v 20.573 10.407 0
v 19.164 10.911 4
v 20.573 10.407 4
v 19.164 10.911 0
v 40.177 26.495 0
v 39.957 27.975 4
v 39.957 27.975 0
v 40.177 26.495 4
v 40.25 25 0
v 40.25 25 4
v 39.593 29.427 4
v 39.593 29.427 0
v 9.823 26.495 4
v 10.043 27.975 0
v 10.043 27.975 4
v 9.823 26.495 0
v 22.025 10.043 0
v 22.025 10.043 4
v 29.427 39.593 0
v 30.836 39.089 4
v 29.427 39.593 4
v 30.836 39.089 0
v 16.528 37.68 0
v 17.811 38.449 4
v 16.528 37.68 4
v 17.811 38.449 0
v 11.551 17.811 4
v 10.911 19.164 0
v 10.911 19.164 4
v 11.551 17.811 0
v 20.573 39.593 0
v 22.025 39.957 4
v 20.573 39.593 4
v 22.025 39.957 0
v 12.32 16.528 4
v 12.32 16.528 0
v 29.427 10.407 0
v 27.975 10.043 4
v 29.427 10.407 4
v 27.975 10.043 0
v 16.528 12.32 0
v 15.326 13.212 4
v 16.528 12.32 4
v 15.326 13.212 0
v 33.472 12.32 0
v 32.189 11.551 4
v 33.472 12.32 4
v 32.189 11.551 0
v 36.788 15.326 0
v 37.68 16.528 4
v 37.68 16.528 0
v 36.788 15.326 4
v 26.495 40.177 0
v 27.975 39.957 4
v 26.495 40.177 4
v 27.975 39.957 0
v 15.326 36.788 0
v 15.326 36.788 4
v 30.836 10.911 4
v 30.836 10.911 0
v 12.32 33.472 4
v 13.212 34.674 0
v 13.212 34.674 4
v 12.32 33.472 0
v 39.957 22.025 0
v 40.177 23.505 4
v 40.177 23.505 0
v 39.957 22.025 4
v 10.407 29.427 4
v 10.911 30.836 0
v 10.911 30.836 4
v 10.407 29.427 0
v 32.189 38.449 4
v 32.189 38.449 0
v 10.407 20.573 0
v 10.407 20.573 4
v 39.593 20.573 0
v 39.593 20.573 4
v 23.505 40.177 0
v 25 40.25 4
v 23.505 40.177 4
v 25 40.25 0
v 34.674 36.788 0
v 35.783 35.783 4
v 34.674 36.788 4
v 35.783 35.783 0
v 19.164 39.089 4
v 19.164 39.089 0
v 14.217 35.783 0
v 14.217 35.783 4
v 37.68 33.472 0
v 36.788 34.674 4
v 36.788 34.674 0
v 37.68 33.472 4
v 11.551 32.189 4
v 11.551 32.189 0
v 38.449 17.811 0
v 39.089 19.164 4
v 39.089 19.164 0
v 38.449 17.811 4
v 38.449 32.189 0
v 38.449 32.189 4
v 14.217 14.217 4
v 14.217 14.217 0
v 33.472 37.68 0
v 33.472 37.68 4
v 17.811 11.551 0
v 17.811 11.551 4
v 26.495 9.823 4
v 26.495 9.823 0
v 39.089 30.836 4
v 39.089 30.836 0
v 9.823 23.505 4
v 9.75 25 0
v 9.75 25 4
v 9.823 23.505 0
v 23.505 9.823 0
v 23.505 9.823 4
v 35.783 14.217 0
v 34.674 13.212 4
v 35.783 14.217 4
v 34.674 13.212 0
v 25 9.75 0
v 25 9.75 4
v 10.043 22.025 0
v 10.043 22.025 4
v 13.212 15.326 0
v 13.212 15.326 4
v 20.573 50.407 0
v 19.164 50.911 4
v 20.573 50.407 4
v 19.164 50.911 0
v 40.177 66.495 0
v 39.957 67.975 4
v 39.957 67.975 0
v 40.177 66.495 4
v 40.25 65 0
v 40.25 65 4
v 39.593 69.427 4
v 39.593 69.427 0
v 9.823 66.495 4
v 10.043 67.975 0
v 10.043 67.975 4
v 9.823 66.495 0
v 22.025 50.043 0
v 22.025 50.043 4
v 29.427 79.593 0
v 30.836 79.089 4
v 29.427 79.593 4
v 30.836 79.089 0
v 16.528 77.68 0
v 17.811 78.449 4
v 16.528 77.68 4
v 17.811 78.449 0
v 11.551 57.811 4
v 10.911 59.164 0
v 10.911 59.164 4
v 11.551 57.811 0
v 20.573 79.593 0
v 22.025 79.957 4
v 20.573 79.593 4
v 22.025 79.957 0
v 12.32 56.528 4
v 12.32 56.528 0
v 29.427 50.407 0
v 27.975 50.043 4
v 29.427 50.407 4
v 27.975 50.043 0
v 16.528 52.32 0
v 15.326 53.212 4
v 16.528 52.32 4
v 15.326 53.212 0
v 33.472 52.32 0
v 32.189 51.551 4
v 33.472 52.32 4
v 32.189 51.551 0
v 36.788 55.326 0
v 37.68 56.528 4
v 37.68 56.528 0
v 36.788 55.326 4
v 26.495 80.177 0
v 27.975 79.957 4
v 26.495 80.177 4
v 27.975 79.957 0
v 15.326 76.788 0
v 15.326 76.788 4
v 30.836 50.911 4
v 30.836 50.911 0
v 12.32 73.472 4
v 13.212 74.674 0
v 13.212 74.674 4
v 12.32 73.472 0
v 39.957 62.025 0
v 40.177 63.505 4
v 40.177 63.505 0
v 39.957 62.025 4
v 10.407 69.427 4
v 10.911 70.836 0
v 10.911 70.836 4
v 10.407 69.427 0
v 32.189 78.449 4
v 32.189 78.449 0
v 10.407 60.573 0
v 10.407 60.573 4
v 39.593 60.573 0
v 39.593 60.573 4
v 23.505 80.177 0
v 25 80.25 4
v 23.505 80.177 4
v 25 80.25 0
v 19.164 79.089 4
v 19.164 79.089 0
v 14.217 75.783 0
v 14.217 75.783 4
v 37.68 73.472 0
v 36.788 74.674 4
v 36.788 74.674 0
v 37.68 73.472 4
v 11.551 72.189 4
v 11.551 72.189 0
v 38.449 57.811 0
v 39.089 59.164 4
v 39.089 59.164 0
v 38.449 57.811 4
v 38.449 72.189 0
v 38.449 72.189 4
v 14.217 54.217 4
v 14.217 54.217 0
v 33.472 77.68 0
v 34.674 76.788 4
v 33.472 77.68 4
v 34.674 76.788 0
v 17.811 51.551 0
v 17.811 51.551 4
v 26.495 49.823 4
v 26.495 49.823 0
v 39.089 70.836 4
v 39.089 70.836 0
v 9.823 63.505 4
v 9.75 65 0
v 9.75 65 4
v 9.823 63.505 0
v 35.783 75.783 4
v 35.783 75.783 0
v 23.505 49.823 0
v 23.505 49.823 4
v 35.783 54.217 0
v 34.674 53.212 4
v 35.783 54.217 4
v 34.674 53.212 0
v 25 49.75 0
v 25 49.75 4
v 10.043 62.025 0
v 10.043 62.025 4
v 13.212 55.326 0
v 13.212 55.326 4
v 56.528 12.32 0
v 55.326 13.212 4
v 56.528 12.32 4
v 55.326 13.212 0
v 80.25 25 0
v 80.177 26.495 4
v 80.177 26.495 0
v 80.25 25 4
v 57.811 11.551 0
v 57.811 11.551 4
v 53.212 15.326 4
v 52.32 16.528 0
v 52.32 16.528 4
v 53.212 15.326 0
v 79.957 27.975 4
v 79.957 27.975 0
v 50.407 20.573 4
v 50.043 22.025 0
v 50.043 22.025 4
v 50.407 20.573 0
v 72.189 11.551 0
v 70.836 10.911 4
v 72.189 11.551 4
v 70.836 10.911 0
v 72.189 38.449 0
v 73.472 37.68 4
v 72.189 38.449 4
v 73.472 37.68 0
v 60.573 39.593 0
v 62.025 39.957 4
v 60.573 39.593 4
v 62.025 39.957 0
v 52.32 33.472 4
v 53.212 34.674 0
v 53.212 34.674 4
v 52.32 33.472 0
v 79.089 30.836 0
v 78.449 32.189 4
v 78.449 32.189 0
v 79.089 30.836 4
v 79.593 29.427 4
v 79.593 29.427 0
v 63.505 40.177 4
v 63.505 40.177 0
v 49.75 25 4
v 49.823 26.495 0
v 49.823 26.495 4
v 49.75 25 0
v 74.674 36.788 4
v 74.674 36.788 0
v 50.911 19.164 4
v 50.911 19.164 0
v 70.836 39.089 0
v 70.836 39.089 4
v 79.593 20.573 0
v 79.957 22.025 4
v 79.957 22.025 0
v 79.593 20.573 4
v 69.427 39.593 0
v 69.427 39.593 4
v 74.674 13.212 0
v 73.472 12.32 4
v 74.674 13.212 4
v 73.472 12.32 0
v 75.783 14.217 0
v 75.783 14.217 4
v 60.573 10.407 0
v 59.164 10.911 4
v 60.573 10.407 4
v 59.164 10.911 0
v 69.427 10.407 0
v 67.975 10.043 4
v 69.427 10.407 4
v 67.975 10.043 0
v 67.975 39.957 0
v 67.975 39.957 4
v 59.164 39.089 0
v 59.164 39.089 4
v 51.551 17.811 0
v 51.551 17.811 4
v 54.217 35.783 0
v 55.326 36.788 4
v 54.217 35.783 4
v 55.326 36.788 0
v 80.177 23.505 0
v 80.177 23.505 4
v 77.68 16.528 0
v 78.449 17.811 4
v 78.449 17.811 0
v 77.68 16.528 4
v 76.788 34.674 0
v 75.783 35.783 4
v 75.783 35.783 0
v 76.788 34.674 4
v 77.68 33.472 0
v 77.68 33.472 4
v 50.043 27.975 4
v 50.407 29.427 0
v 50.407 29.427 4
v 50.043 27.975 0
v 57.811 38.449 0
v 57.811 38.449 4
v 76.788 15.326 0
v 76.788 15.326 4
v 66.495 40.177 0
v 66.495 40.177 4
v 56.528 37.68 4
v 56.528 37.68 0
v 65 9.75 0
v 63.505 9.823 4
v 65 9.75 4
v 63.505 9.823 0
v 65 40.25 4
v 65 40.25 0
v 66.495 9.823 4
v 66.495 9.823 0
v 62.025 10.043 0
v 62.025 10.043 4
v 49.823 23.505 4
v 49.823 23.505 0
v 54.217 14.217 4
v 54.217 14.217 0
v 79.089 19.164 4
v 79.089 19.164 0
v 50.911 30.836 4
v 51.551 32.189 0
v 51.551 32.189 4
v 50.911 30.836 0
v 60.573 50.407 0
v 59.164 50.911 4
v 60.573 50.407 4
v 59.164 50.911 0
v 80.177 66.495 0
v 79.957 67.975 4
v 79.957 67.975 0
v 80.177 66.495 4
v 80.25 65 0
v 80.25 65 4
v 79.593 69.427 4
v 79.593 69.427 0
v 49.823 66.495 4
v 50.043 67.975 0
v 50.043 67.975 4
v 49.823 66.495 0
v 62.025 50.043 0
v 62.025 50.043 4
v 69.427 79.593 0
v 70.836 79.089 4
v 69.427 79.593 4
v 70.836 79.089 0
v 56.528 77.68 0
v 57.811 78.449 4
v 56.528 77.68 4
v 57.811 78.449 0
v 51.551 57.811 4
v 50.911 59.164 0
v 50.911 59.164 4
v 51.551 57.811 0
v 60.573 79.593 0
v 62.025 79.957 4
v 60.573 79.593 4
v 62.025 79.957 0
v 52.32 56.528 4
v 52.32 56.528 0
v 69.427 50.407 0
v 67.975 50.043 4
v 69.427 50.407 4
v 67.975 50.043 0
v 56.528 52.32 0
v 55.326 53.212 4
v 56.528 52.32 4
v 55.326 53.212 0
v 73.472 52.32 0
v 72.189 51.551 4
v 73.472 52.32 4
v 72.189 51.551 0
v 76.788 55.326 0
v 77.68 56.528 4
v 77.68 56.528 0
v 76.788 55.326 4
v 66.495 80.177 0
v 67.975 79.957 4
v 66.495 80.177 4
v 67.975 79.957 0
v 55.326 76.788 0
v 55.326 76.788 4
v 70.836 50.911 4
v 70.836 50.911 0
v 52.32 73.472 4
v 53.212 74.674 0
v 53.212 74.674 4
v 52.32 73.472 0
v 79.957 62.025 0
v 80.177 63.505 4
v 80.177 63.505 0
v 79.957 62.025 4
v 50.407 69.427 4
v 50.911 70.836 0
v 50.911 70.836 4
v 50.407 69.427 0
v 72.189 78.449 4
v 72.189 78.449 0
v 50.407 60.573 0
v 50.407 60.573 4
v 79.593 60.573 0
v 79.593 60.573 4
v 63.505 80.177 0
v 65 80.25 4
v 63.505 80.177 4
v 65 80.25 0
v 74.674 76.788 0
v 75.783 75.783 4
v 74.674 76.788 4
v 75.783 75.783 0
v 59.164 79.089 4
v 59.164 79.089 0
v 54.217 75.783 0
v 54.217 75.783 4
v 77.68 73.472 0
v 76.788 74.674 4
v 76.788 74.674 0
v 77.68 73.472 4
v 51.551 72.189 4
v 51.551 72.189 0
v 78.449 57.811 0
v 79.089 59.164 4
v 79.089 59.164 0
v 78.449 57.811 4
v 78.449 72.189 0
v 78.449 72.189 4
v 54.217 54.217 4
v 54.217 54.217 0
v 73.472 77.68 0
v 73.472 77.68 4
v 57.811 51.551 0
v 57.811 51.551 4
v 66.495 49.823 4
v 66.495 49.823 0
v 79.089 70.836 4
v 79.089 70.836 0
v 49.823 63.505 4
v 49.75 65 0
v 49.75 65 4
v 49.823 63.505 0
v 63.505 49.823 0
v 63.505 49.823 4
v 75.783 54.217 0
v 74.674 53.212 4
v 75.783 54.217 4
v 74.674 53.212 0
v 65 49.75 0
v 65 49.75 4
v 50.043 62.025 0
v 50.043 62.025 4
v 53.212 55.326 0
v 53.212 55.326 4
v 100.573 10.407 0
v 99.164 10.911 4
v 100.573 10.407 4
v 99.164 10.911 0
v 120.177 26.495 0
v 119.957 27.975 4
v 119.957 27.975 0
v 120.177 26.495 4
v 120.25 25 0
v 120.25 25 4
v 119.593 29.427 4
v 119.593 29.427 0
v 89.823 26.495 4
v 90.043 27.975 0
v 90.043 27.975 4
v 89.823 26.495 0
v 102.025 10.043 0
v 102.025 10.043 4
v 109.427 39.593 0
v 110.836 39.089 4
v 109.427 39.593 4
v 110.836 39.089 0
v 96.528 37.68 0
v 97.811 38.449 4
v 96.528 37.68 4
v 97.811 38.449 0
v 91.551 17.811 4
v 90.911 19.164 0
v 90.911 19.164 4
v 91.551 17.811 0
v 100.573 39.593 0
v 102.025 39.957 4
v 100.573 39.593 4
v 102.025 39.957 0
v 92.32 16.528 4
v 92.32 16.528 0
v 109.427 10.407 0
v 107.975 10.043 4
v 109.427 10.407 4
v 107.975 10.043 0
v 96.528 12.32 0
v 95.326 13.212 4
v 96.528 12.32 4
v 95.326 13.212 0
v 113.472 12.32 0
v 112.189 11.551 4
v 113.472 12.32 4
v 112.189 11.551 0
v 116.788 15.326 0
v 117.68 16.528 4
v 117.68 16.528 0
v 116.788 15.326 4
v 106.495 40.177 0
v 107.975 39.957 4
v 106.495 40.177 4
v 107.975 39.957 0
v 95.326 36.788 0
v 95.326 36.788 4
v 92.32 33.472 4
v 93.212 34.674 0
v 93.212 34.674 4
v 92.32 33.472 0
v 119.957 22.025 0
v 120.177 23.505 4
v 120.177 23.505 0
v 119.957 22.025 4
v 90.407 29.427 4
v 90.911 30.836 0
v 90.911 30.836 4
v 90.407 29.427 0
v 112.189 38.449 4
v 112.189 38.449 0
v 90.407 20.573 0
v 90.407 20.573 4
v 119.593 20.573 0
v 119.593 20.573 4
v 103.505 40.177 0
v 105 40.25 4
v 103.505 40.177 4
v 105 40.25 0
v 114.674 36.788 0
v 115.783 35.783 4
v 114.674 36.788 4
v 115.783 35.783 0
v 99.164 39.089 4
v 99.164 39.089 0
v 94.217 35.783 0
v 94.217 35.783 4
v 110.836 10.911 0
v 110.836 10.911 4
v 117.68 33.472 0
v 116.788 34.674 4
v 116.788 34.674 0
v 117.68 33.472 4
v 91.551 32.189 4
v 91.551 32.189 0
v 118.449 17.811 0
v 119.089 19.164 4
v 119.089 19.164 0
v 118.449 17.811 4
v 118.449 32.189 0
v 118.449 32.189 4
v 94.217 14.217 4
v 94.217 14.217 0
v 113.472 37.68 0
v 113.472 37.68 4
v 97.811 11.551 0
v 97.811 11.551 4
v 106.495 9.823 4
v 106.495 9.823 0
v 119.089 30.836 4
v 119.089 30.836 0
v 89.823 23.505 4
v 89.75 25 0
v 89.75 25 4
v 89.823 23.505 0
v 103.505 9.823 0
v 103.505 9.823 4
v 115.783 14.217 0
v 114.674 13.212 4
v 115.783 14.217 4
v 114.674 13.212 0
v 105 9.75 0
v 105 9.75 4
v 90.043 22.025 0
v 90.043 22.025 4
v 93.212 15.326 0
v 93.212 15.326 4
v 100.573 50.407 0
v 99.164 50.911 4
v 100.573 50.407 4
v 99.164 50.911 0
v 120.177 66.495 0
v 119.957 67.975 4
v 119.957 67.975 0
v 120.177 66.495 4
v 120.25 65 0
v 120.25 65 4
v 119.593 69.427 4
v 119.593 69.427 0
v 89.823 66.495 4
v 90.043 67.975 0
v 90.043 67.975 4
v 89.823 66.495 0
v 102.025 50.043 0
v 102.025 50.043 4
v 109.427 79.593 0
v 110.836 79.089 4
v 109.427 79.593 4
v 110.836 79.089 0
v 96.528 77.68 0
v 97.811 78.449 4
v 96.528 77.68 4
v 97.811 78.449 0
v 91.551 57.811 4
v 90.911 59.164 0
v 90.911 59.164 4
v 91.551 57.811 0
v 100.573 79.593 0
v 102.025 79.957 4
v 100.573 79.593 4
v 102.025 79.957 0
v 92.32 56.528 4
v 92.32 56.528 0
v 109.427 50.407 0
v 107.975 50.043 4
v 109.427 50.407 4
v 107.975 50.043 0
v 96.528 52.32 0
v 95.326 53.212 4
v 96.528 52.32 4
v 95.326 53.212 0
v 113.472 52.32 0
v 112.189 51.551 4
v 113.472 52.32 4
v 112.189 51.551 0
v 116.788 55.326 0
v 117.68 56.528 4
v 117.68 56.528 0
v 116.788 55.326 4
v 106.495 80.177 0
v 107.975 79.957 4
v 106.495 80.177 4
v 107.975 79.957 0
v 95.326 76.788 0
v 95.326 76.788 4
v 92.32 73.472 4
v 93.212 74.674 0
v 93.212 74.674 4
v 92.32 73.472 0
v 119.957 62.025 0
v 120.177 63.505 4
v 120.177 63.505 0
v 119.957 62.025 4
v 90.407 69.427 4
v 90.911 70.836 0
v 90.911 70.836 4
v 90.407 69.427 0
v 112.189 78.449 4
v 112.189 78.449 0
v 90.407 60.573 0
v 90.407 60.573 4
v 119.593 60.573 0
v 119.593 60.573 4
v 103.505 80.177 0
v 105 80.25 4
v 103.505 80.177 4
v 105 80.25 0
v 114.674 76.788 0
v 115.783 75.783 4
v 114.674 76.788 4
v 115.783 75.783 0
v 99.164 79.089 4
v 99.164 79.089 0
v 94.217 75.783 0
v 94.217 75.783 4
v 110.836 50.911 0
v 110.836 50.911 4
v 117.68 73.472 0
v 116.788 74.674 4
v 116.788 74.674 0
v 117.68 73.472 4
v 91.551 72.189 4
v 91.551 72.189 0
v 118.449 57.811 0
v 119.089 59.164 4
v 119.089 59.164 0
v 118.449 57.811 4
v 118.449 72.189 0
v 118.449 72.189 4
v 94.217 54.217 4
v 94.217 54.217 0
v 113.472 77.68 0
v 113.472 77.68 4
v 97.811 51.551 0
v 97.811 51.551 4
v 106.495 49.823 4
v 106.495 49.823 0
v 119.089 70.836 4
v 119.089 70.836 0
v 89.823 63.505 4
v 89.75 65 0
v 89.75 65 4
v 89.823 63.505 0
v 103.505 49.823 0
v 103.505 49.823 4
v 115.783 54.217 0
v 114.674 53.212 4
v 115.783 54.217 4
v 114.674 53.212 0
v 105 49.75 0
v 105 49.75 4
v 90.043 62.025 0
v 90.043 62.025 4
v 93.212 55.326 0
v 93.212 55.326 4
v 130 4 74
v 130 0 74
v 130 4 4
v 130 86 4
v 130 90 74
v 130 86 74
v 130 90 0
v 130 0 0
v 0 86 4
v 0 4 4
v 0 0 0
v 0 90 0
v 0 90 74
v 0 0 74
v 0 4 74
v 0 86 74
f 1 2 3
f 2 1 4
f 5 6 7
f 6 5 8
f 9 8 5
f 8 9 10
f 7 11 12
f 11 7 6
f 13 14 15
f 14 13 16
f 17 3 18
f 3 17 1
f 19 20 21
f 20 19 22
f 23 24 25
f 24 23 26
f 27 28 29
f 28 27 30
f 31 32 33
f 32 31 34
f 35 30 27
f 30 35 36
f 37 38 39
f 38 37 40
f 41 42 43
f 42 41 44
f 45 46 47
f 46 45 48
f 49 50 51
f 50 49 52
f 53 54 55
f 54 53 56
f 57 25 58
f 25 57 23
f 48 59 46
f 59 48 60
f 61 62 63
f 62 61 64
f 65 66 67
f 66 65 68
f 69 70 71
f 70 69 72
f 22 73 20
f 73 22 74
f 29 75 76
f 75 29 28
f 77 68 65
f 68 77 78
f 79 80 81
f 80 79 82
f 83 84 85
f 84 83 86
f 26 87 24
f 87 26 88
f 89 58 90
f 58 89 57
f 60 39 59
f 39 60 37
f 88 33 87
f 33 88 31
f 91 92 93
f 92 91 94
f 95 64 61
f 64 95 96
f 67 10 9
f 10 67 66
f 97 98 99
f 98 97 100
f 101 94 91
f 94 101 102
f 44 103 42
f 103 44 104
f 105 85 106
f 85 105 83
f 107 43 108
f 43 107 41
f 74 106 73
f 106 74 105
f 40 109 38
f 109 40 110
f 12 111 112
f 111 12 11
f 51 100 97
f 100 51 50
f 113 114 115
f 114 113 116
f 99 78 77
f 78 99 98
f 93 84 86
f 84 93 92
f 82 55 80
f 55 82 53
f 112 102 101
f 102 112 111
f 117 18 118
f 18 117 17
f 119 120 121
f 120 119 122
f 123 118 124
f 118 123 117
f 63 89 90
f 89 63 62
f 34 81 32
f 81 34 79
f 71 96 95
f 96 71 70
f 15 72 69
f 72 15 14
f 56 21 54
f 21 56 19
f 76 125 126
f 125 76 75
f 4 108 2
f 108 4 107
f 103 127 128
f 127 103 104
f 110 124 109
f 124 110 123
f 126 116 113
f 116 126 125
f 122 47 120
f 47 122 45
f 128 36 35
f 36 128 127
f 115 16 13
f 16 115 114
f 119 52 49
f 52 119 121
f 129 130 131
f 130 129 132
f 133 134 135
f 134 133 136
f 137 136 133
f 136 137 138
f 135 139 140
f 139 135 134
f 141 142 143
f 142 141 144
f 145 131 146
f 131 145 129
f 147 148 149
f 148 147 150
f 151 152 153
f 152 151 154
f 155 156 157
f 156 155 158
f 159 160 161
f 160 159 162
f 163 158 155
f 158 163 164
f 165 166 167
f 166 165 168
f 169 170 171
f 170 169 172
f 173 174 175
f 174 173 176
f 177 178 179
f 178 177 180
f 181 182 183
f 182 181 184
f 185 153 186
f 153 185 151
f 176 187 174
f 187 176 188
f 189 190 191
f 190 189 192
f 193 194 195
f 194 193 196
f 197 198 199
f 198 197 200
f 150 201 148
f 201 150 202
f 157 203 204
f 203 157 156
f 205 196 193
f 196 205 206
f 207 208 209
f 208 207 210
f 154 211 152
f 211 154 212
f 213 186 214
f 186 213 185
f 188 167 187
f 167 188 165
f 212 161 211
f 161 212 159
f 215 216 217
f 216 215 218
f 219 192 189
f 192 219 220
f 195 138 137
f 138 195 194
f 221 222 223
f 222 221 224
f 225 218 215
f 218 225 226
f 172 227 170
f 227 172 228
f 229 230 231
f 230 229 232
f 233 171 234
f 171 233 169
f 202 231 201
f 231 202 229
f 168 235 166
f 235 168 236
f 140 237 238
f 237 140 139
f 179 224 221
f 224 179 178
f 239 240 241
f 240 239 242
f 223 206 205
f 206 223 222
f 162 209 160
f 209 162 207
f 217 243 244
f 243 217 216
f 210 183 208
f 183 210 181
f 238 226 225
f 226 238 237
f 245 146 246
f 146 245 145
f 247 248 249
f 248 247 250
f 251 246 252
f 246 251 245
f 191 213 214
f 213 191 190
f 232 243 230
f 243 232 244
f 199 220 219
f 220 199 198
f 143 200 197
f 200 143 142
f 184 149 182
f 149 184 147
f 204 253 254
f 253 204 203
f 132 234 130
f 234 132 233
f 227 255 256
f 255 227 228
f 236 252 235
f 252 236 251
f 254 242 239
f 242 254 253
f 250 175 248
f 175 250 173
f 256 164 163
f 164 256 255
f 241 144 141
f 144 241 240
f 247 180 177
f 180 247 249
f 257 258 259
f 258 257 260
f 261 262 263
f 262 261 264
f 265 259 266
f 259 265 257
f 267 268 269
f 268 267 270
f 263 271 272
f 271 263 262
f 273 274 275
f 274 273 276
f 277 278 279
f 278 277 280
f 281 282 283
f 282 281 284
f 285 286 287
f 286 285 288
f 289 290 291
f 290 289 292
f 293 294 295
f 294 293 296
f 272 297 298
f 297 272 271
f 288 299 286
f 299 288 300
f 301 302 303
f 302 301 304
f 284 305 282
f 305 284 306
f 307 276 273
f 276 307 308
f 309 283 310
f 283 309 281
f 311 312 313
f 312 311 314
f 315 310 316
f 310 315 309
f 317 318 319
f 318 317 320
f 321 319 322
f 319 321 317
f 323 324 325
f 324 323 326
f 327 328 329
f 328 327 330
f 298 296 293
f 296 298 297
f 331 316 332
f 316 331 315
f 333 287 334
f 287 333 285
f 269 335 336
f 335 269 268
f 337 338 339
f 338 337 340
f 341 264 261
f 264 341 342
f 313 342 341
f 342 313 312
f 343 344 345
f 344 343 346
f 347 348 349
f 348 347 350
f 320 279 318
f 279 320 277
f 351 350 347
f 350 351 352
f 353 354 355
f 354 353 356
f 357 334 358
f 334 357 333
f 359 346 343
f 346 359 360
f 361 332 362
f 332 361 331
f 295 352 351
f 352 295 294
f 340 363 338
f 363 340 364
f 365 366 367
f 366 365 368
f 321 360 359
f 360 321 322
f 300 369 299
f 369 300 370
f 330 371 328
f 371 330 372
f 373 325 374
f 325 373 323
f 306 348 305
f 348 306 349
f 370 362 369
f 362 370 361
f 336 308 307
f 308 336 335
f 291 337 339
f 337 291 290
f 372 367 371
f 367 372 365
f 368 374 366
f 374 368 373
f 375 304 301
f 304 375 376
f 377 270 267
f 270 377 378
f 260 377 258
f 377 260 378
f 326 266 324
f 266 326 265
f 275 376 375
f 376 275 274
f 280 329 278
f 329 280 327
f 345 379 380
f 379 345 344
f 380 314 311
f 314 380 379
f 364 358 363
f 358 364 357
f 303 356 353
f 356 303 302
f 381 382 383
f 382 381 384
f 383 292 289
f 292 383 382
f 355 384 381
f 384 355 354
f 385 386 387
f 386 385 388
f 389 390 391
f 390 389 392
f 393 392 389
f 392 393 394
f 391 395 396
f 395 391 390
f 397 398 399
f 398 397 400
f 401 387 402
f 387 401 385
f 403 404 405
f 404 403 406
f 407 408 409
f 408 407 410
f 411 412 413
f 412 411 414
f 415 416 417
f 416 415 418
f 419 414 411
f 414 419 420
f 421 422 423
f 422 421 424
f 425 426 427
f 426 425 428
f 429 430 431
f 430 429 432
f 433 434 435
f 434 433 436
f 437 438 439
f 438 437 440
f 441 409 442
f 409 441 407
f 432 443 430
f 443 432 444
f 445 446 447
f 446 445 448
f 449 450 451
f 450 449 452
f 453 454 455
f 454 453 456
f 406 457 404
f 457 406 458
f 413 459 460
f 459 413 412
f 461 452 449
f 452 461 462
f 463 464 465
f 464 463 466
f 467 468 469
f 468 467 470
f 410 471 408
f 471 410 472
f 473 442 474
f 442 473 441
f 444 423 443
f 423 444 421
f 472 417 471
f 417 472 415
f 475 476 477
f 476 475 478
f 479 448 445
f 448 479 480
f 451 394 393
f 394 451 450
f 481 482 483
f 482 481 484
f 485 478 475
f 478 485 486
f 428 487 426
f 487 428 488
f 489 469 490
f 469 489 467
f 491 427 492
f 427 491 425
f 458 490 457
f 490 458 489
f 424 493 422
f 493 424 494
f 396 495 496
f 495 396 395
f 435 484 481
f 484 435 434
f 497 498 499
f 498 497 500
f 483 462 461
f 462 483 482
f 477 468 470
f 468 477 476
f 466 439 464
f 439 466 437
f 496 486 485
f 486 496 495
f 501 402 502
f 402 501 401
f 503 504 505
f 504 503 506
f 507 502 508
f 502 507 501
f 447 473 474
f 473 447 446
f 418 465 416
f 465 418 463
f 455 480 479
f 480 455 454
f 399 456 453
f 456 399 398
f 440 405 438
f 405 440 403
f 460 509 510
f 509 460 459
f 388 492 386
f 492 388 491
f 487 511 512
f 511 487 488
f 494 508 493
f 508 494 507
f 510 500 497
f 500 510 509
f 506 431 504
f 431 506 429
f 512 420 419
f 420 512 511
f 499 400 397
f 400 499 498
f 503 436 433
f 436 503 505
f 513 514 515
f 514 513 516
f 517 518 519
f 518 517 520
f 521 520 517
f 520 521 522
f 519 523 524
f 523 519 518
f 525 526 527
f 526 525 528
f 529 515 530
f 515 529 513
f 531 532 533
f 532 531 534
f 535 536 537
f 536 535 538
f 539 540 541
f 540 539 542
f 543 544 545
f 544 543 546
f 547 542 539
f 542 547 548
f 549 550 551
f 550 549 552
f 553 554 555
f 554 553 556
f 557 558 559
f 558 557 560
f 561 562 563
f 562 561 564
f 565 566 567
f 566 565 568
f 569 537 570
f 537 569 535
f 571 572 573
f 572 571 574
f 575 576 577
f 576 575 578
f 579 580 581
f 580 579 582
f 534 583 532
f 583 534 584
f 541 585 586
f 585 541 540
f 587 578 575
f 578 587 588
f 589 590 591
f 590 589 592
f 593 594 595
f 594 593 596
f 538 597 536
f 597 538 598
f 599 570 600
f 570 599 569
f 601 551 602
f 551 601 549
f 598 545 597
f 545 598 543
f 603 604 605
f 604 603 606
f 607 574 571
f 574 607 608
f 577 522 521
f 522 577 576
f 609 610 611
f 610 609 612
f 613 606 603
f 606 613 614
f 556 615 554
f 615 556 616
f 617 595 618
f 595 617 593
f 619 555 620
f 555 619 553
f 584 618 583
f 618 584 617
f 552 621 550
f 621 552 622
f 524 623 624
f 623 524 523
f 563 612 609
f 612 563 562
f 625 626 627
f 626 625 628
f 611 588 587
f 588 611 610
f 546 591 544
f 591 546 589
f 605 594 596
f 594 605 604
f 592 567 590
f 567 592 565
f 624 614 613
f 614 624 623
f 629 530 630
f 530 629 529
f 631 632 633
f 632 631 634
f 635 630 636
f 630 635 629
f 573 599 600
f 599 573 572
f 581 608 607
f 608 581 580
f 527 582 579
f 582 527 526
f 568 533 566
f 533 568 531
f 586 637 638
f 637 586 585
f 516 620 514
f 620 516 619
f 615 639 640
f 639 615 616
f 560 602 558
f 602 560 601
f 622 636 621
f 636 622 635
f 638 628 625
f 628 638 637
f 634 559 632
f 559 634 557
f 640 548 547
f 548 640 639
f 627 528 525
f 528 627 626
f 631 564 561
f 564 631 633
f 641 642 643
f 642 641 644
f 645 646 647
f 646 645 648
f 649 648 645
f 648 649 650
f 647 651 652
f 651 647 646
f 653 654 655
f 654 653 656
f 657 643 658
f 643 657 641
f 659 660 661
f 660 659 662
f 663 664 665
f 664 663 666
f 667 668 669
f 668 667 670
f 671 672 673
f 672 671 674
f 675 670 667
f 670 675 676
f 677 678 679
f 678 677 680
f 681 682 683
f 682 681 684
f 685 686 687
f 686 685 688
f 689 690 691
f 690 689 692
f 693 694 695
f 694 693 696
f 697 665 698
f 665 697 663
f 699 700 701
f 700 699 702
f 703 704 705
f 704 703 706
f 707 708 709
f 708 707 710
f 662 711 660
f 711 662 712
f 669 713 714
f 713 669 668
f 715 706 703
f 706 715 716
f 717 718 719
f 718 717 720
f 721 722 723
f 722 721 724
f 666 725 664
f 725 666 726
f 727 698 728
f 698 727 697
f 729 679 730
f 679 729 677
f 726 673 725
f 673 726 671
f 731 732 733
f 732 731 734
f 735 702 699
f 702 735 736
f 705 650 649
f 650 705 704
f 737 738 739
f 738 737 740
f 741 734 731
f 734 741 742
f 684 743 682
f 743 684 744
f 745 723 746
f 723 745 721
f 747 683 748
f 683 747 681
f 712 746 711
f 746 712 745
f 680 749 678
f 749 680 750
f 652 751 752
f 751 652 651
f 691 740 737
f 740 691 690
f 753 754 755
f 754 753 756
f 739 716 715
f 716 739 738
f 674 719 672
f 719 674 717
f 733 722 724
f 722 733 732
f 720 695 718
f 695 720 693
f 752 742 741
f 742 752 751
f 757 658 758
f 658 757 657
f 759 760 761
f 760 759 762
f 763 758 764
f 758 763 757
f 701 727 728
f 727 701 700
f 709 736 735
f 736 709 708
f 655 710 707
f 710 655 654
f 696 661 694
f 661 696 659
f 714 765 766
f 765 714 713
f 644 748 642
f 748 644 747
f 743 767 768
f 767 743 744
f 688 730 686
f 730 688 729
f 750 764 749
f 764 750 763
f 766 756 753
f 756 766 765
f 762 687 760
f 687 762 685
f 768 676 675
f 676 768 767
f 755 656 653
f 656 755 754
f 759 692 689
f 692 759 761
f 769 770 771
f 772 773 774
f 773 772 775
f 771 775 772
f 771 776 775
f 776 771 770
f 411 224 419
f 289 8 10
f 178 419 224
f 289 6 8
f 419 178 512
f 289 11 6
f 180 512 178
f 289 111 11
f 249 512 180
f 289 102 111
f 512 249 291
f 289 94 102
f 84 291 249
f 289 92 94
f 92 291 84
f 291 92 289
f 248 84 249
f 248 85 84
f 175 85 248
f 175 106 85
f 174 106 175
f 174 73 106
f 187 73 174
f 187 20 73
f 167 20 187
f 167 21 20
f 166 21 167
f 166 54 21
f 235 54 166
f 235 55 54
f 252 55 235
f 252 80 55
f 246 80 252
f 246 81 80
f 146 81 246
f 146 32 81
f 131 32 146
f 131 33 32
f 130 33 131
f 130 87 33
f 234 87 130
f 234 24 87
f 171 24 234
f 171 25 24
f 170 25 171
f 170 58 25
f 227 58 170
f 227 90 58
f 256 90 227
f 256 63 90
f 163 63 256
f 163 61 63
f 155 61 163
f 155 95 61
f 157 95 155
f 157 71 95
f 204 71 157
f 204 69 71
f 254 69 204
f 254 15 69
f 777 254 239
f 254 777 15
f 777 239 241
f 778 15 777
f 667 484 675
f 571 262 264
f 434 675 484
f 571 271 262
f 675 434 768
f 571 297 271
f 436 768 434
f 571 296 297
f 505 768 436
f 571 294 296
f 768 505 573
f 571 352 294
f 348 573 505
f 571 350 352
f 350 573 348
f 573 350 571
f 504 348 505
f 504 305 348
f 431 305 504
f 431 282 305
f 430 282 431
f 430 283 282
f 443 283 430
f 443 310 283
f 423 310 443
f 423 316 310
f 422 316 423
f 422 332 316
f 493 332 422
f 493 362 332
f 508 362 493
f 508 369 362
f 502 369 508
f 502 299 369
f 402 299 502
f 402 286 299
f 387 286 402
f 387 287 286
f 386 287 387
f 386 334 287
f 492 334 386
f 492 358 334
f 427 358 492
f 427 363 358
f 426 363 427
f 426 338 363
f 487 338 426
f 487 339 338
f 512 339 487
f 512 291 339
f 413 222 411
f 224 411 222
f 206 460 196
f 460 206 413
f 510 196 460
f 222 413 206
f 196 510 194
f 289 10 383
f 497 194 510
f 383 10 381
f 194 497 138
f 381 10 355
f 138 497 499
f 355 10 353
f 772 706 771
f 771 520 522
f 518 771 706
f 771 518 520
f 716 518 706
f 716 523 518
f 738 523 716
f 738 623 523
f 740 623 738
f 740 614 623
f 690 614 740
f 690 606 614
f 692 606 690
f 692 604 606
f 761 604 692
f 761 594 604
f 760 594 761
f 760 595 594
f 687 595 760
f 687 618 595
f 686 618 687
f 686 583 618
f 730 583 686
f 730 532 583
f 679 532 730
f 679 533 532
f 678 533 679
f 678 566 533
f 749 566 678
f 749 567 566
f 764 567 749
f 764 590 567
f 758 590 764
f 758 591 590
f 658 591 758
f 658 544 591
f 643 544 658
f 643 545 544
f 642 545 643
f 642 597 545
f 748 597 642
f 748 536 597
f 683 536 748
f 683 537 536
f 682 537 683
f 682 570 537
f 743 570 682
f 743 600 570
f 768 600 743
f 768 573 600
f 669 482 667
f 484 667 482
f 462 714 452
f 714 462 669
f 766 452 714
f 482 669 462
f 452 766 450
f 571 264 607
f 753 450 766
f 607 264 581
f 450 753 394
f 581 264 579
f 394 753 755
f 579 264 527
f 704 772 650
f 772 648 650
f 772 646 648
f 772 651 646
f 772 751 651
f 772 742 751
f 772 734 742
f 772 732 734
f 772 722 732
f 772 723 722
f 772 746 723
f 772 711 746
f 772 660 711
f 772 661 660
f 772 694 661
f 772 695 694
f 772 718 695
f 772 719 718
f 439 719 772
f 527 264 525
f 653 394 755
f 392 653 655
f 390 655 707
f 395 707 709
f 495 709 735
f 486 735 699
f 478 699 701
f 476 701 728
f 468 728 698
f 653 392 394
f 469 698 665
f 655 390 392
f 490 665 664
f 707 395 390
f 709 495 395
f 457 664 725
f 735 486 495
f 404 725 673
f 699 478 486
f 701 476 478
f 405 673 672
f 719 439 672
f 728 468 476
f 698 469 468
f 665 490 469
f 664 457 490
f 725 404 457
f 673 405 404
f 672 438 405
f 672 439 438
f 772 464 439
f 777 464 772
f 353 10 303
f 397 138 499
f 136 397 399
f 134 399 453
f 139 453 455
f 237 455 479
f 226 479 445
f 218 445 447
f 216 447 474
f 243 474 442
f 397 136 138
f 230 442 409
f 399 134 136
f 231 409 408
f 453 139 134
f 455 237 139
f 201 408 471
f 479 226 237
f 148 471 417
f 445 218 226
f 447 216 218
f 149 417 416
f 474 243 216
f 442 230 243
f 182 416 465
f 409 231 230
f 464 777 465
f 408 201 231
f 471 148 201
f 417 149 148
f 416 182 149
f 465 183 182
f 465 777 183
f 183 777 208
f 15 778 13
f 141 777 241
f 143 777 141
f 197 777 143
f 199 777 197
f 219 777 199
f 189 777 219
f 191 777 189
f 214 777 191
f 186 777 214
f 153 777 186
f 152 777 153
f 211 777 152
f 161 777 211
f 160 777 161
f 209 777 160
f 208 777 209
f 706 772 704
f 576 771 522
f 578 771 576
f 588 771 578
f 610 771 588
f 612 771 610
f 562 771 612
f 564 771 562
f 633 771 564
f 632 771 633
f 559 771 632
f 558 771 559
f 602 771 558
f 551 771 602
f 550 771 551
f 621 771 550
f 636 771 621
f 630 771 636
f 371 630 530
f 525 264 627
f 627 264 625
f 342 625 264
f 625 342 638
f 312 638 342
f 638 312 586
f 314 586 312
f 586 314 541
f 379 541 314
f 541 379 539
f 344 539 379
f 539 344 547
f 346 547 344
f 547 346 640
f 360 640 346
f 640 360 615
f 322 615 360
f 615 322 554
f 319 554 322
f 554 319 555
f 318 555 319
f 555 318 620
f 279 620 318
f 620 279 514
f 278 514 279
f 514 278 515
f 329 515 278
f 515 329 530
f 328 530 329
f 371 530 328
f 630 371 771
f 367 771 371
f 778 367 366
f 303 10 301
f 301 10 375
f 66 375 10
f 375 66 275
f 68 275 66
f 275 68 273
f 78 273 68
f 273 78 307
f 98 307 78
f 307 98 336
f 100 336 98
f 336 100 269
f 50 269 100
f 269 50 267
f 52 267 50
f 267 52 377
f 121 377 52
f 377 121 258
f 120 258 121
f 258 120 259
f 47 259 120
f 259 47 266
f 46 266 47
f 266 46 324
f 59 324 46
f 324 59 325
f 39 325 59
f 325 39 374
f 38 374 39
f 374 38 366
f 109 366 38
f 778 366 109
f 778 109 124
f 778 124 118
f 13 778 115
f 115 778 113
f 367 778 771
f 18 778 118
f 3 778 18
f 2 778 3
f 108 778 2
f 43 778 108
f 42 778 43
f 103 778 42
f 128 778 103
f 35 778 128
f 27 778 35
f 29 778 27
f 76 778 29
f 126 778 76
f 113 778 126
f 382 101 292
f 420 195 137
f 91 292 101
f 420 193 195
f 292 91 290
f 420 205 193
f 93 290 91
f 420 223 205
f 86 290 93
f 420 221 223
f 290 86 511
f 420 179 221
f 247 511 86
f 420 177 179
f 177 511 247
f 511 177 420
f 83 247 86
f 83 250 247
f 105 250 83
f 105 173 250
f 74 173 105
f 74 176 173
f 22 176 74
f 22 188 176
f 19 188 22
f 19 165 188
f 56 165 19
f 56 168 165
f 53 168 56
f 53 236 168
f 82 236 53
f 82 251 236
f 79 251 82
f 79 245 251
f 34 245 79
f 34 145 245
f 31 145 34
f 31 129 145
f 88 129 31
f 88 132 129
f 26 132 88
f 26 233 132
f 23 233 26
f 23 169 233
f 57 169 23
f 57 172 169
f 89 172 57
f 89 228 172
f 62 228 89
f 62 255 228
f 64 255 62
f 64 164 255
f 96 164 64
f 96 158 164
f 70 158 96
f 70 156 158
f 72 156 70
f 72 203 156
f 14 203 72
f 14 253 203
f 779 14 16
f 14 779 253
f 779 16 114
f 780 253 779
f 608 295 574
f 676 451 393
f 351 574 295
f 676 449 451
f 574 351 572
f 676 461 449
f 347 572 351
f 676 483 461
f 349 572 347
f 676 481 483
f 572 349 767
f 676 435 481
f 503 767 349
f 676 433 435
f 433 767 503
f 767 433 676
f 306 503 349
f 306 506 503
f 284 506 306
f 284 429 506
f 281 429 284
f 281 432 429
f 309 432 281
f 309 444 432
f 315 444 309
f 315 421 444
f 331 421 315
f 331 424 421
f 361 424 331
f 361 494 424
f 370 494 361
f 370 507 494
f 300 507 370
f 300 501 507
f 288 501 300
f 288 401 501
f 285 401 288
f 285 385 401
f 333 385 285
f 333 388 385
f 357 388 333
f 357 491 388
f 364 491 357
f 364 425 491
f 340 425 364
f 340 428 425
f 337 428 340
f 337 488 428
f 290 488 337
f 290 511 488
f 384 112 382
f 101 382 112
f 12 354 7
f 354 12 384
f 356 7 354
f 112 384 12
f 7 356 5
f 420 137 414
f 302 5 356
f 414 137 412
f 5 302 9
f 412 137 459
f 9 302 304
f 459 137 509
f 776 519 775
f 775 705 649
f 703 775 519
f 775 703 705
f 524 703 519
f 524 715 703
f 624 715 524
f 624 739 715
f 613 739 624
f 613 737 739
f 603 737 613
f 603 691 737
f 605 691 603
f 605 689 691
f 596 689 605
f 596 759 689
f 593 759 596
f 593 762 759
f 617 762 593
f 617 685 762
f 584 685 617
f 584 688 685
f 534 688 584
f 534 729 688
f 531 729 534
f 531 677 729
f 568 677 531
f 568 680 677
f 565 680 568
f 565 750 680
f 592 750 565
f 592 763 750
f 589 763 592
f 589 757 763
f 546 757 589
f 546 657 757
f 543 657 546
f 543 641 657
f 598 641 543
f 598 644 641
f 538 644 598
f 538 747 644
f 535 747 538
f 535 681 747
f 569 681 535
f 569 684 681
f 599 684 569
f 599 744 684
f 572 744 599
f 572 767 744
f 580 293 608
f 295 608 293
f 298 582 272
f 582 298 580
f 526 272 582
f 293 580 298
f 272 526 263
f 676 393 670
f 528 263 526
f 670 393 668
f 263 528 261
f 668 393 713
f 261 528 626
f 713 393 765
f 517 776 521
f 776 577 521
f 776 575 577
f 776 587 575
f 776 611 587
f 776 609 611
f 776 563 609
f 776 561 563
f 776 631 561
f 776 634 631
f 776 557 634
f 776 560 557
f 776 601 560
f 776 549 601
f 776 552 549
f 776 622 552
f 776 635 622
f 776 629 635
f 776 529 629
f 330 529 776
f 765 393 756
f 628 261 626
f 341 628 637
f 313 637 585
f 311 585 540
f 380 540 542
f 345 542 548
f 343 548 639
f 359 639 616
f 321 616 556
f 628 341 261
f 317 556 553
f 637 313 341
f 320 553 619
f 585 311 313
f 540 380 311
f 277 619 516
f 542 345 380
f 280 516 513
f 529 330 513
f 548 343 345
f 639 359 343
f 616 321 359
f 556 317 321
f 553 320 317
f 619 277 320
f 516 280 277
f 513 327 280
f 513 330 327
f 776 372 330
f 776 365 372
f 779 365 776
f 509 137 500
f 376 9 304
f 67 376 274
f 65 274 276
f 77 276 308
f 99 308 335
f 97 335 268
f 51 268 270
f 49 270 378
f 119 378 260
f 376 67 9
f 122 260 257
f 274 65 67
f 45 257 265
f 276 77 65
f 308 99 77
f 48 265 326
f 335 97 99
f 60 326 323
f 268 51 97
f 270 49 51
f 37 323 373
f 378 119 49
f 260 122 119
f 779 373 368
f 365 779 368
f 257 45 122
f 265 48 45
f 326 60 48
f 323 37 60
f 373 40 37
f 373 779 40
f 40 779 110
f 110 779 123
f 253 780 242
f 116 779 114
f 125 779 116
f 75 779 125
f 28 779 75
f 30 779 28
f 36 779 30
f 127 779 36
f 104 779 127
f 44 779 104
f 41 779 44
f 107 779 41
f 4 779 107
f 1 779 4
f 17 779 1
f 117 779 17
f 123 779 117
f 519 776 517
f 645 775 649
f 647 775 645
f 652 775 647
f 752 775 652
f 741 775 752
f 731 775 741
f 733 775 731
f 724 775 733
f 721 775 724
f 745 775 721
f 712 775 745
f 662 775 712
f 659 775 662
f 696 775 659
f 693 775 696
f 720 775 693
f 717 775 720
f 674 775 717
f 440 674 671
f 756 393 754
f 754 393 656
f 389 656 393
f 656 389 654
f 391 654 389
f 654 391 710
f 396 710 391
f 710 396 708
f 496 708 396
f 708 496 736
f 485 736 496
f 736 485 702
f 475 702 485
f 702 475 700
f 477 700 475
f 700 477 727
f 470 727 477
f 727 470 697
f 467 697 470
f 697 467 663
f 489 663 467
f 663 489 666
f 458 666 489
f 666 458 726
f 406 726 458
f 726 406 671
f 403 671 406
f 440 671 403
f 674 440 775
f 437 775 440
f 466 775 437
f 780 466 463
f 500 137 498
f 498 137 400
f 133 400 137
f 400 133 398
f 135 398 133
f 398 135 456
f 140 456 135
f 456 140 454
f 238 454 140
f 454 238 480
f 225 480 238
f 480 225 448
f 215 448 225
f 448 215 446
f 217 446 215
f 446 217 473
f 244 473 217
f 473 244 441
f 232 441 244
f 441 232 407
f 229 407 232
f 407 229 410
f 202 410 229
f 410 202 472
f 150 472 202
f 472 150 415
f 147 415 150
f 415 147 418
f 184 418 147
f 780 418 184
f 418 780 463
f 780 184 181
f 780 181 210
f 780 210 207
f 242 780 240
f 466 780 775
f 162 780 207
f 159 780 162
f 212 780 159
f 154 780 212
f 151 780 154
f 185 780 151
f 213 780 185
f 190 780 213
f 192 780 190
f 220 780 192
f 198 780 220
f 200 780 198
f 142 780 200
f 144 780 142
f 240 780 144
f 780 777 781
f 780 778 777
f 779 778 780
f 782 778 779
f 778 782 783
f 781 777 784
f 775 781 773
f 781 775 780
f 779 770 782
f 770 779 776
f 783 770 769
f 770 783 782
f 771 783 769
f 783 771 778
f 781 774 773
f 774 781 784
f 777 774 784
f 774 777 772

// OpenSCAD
// --- Dimensions (mm) ---
plate_width = 130;       // X dimension of the plate
plate_depth = 90;        // Y dimension of the plate
plate_thickness = 4;     // Z dimension of the plate
wall_height = 70;        // Height of the side walls (Z)
wall_thickness = 4;      // Thickness of the side walls (Y)

hole_diameter = 30.5;    // Diameter of the tube holes
hole_spacing_x = 40;     // Center-to-center distance X
hole_spacing_y = 40;     // Center-to-center distance Y
holes_x = 3;             // Number of holes in X direction
holes_y = 2;             // Number of holes in Y direction

// --- Internal Calculations ---
// Calculate the starting offset to center the grid on the plate
offset_x = (plate_width - (holes_x - 1) * hole_spacing_x) / 2;
offset_y = (plate_depth - (holes_y - 1) * hole_spacing_y) / 2;

// Resolution
$fn = 64;

// --- Modeling ---
// The part is designed to be printed "upside down" (walls pointing down in Z)
// and then flipped. To achieve the user's description of the print orientation:
// The plate is at Z=0 to 4. The walls rise from the plate to Z=70.
// This means the walls are printed "upwards" from the bed.
// To print "upside down" as requested, we model it as described, 
// but the user's instruction implies the final standing orientation 
// is the result of flipping the print.

union() {
    // 1. The Base Plate
    difference() {
        // Main plate body
        cube([plate_width, plate_depth, plate_thickness]);

        // 2. The Six Holes
        // We use a nested loop to create the 3x2 grid
        for (i = [0 : holes_x - 1]) {
            for (j = [0 : holes_y - 1]) {
                translate(
                    [offset_x + i * hole_spacing_x, 
                     offset_y + j * hole_spacing_y, 
                     -1] // Extend slightly below plate
                )
                cylinder(h = plate_thickness + 2, d = hole_diameter);
            }
        }
    }

    // 3. The Two Side Walls
    // Walls are flush with the long edges (X-axis edges)
    // Long edges are at Y = 0 and Y = plate_depth
    
    // Wall 1 (at Y = 0)
    translate([0, 0, plate_thickness])
    cube([plate_width, wall_thickness, wall_height]);

    // Wall 2 (at Y = plate_depth - wall_thickness)
    // Note: To be "flush with the long edge" and 4mm thick, 
    // the wall occupies the space from Y = plate_depth - 4 to plate_depth.
    translate([0, plate_depth - wall_thickness, plate_thickness])
    cube([plate_width, wall_thickness, wall_height]);
}

// Note on Orientation:
// The model is built with the plate at Z=0.
// The walls extend from Z=4 to Z=74.
// When printed, the plate sits on the bed. 
// The user's instruction "It is printed upside down and flipped over" 
// suggests the user wants the walls to be the contact points 
// when standing, which is achieved by the geometry described.
